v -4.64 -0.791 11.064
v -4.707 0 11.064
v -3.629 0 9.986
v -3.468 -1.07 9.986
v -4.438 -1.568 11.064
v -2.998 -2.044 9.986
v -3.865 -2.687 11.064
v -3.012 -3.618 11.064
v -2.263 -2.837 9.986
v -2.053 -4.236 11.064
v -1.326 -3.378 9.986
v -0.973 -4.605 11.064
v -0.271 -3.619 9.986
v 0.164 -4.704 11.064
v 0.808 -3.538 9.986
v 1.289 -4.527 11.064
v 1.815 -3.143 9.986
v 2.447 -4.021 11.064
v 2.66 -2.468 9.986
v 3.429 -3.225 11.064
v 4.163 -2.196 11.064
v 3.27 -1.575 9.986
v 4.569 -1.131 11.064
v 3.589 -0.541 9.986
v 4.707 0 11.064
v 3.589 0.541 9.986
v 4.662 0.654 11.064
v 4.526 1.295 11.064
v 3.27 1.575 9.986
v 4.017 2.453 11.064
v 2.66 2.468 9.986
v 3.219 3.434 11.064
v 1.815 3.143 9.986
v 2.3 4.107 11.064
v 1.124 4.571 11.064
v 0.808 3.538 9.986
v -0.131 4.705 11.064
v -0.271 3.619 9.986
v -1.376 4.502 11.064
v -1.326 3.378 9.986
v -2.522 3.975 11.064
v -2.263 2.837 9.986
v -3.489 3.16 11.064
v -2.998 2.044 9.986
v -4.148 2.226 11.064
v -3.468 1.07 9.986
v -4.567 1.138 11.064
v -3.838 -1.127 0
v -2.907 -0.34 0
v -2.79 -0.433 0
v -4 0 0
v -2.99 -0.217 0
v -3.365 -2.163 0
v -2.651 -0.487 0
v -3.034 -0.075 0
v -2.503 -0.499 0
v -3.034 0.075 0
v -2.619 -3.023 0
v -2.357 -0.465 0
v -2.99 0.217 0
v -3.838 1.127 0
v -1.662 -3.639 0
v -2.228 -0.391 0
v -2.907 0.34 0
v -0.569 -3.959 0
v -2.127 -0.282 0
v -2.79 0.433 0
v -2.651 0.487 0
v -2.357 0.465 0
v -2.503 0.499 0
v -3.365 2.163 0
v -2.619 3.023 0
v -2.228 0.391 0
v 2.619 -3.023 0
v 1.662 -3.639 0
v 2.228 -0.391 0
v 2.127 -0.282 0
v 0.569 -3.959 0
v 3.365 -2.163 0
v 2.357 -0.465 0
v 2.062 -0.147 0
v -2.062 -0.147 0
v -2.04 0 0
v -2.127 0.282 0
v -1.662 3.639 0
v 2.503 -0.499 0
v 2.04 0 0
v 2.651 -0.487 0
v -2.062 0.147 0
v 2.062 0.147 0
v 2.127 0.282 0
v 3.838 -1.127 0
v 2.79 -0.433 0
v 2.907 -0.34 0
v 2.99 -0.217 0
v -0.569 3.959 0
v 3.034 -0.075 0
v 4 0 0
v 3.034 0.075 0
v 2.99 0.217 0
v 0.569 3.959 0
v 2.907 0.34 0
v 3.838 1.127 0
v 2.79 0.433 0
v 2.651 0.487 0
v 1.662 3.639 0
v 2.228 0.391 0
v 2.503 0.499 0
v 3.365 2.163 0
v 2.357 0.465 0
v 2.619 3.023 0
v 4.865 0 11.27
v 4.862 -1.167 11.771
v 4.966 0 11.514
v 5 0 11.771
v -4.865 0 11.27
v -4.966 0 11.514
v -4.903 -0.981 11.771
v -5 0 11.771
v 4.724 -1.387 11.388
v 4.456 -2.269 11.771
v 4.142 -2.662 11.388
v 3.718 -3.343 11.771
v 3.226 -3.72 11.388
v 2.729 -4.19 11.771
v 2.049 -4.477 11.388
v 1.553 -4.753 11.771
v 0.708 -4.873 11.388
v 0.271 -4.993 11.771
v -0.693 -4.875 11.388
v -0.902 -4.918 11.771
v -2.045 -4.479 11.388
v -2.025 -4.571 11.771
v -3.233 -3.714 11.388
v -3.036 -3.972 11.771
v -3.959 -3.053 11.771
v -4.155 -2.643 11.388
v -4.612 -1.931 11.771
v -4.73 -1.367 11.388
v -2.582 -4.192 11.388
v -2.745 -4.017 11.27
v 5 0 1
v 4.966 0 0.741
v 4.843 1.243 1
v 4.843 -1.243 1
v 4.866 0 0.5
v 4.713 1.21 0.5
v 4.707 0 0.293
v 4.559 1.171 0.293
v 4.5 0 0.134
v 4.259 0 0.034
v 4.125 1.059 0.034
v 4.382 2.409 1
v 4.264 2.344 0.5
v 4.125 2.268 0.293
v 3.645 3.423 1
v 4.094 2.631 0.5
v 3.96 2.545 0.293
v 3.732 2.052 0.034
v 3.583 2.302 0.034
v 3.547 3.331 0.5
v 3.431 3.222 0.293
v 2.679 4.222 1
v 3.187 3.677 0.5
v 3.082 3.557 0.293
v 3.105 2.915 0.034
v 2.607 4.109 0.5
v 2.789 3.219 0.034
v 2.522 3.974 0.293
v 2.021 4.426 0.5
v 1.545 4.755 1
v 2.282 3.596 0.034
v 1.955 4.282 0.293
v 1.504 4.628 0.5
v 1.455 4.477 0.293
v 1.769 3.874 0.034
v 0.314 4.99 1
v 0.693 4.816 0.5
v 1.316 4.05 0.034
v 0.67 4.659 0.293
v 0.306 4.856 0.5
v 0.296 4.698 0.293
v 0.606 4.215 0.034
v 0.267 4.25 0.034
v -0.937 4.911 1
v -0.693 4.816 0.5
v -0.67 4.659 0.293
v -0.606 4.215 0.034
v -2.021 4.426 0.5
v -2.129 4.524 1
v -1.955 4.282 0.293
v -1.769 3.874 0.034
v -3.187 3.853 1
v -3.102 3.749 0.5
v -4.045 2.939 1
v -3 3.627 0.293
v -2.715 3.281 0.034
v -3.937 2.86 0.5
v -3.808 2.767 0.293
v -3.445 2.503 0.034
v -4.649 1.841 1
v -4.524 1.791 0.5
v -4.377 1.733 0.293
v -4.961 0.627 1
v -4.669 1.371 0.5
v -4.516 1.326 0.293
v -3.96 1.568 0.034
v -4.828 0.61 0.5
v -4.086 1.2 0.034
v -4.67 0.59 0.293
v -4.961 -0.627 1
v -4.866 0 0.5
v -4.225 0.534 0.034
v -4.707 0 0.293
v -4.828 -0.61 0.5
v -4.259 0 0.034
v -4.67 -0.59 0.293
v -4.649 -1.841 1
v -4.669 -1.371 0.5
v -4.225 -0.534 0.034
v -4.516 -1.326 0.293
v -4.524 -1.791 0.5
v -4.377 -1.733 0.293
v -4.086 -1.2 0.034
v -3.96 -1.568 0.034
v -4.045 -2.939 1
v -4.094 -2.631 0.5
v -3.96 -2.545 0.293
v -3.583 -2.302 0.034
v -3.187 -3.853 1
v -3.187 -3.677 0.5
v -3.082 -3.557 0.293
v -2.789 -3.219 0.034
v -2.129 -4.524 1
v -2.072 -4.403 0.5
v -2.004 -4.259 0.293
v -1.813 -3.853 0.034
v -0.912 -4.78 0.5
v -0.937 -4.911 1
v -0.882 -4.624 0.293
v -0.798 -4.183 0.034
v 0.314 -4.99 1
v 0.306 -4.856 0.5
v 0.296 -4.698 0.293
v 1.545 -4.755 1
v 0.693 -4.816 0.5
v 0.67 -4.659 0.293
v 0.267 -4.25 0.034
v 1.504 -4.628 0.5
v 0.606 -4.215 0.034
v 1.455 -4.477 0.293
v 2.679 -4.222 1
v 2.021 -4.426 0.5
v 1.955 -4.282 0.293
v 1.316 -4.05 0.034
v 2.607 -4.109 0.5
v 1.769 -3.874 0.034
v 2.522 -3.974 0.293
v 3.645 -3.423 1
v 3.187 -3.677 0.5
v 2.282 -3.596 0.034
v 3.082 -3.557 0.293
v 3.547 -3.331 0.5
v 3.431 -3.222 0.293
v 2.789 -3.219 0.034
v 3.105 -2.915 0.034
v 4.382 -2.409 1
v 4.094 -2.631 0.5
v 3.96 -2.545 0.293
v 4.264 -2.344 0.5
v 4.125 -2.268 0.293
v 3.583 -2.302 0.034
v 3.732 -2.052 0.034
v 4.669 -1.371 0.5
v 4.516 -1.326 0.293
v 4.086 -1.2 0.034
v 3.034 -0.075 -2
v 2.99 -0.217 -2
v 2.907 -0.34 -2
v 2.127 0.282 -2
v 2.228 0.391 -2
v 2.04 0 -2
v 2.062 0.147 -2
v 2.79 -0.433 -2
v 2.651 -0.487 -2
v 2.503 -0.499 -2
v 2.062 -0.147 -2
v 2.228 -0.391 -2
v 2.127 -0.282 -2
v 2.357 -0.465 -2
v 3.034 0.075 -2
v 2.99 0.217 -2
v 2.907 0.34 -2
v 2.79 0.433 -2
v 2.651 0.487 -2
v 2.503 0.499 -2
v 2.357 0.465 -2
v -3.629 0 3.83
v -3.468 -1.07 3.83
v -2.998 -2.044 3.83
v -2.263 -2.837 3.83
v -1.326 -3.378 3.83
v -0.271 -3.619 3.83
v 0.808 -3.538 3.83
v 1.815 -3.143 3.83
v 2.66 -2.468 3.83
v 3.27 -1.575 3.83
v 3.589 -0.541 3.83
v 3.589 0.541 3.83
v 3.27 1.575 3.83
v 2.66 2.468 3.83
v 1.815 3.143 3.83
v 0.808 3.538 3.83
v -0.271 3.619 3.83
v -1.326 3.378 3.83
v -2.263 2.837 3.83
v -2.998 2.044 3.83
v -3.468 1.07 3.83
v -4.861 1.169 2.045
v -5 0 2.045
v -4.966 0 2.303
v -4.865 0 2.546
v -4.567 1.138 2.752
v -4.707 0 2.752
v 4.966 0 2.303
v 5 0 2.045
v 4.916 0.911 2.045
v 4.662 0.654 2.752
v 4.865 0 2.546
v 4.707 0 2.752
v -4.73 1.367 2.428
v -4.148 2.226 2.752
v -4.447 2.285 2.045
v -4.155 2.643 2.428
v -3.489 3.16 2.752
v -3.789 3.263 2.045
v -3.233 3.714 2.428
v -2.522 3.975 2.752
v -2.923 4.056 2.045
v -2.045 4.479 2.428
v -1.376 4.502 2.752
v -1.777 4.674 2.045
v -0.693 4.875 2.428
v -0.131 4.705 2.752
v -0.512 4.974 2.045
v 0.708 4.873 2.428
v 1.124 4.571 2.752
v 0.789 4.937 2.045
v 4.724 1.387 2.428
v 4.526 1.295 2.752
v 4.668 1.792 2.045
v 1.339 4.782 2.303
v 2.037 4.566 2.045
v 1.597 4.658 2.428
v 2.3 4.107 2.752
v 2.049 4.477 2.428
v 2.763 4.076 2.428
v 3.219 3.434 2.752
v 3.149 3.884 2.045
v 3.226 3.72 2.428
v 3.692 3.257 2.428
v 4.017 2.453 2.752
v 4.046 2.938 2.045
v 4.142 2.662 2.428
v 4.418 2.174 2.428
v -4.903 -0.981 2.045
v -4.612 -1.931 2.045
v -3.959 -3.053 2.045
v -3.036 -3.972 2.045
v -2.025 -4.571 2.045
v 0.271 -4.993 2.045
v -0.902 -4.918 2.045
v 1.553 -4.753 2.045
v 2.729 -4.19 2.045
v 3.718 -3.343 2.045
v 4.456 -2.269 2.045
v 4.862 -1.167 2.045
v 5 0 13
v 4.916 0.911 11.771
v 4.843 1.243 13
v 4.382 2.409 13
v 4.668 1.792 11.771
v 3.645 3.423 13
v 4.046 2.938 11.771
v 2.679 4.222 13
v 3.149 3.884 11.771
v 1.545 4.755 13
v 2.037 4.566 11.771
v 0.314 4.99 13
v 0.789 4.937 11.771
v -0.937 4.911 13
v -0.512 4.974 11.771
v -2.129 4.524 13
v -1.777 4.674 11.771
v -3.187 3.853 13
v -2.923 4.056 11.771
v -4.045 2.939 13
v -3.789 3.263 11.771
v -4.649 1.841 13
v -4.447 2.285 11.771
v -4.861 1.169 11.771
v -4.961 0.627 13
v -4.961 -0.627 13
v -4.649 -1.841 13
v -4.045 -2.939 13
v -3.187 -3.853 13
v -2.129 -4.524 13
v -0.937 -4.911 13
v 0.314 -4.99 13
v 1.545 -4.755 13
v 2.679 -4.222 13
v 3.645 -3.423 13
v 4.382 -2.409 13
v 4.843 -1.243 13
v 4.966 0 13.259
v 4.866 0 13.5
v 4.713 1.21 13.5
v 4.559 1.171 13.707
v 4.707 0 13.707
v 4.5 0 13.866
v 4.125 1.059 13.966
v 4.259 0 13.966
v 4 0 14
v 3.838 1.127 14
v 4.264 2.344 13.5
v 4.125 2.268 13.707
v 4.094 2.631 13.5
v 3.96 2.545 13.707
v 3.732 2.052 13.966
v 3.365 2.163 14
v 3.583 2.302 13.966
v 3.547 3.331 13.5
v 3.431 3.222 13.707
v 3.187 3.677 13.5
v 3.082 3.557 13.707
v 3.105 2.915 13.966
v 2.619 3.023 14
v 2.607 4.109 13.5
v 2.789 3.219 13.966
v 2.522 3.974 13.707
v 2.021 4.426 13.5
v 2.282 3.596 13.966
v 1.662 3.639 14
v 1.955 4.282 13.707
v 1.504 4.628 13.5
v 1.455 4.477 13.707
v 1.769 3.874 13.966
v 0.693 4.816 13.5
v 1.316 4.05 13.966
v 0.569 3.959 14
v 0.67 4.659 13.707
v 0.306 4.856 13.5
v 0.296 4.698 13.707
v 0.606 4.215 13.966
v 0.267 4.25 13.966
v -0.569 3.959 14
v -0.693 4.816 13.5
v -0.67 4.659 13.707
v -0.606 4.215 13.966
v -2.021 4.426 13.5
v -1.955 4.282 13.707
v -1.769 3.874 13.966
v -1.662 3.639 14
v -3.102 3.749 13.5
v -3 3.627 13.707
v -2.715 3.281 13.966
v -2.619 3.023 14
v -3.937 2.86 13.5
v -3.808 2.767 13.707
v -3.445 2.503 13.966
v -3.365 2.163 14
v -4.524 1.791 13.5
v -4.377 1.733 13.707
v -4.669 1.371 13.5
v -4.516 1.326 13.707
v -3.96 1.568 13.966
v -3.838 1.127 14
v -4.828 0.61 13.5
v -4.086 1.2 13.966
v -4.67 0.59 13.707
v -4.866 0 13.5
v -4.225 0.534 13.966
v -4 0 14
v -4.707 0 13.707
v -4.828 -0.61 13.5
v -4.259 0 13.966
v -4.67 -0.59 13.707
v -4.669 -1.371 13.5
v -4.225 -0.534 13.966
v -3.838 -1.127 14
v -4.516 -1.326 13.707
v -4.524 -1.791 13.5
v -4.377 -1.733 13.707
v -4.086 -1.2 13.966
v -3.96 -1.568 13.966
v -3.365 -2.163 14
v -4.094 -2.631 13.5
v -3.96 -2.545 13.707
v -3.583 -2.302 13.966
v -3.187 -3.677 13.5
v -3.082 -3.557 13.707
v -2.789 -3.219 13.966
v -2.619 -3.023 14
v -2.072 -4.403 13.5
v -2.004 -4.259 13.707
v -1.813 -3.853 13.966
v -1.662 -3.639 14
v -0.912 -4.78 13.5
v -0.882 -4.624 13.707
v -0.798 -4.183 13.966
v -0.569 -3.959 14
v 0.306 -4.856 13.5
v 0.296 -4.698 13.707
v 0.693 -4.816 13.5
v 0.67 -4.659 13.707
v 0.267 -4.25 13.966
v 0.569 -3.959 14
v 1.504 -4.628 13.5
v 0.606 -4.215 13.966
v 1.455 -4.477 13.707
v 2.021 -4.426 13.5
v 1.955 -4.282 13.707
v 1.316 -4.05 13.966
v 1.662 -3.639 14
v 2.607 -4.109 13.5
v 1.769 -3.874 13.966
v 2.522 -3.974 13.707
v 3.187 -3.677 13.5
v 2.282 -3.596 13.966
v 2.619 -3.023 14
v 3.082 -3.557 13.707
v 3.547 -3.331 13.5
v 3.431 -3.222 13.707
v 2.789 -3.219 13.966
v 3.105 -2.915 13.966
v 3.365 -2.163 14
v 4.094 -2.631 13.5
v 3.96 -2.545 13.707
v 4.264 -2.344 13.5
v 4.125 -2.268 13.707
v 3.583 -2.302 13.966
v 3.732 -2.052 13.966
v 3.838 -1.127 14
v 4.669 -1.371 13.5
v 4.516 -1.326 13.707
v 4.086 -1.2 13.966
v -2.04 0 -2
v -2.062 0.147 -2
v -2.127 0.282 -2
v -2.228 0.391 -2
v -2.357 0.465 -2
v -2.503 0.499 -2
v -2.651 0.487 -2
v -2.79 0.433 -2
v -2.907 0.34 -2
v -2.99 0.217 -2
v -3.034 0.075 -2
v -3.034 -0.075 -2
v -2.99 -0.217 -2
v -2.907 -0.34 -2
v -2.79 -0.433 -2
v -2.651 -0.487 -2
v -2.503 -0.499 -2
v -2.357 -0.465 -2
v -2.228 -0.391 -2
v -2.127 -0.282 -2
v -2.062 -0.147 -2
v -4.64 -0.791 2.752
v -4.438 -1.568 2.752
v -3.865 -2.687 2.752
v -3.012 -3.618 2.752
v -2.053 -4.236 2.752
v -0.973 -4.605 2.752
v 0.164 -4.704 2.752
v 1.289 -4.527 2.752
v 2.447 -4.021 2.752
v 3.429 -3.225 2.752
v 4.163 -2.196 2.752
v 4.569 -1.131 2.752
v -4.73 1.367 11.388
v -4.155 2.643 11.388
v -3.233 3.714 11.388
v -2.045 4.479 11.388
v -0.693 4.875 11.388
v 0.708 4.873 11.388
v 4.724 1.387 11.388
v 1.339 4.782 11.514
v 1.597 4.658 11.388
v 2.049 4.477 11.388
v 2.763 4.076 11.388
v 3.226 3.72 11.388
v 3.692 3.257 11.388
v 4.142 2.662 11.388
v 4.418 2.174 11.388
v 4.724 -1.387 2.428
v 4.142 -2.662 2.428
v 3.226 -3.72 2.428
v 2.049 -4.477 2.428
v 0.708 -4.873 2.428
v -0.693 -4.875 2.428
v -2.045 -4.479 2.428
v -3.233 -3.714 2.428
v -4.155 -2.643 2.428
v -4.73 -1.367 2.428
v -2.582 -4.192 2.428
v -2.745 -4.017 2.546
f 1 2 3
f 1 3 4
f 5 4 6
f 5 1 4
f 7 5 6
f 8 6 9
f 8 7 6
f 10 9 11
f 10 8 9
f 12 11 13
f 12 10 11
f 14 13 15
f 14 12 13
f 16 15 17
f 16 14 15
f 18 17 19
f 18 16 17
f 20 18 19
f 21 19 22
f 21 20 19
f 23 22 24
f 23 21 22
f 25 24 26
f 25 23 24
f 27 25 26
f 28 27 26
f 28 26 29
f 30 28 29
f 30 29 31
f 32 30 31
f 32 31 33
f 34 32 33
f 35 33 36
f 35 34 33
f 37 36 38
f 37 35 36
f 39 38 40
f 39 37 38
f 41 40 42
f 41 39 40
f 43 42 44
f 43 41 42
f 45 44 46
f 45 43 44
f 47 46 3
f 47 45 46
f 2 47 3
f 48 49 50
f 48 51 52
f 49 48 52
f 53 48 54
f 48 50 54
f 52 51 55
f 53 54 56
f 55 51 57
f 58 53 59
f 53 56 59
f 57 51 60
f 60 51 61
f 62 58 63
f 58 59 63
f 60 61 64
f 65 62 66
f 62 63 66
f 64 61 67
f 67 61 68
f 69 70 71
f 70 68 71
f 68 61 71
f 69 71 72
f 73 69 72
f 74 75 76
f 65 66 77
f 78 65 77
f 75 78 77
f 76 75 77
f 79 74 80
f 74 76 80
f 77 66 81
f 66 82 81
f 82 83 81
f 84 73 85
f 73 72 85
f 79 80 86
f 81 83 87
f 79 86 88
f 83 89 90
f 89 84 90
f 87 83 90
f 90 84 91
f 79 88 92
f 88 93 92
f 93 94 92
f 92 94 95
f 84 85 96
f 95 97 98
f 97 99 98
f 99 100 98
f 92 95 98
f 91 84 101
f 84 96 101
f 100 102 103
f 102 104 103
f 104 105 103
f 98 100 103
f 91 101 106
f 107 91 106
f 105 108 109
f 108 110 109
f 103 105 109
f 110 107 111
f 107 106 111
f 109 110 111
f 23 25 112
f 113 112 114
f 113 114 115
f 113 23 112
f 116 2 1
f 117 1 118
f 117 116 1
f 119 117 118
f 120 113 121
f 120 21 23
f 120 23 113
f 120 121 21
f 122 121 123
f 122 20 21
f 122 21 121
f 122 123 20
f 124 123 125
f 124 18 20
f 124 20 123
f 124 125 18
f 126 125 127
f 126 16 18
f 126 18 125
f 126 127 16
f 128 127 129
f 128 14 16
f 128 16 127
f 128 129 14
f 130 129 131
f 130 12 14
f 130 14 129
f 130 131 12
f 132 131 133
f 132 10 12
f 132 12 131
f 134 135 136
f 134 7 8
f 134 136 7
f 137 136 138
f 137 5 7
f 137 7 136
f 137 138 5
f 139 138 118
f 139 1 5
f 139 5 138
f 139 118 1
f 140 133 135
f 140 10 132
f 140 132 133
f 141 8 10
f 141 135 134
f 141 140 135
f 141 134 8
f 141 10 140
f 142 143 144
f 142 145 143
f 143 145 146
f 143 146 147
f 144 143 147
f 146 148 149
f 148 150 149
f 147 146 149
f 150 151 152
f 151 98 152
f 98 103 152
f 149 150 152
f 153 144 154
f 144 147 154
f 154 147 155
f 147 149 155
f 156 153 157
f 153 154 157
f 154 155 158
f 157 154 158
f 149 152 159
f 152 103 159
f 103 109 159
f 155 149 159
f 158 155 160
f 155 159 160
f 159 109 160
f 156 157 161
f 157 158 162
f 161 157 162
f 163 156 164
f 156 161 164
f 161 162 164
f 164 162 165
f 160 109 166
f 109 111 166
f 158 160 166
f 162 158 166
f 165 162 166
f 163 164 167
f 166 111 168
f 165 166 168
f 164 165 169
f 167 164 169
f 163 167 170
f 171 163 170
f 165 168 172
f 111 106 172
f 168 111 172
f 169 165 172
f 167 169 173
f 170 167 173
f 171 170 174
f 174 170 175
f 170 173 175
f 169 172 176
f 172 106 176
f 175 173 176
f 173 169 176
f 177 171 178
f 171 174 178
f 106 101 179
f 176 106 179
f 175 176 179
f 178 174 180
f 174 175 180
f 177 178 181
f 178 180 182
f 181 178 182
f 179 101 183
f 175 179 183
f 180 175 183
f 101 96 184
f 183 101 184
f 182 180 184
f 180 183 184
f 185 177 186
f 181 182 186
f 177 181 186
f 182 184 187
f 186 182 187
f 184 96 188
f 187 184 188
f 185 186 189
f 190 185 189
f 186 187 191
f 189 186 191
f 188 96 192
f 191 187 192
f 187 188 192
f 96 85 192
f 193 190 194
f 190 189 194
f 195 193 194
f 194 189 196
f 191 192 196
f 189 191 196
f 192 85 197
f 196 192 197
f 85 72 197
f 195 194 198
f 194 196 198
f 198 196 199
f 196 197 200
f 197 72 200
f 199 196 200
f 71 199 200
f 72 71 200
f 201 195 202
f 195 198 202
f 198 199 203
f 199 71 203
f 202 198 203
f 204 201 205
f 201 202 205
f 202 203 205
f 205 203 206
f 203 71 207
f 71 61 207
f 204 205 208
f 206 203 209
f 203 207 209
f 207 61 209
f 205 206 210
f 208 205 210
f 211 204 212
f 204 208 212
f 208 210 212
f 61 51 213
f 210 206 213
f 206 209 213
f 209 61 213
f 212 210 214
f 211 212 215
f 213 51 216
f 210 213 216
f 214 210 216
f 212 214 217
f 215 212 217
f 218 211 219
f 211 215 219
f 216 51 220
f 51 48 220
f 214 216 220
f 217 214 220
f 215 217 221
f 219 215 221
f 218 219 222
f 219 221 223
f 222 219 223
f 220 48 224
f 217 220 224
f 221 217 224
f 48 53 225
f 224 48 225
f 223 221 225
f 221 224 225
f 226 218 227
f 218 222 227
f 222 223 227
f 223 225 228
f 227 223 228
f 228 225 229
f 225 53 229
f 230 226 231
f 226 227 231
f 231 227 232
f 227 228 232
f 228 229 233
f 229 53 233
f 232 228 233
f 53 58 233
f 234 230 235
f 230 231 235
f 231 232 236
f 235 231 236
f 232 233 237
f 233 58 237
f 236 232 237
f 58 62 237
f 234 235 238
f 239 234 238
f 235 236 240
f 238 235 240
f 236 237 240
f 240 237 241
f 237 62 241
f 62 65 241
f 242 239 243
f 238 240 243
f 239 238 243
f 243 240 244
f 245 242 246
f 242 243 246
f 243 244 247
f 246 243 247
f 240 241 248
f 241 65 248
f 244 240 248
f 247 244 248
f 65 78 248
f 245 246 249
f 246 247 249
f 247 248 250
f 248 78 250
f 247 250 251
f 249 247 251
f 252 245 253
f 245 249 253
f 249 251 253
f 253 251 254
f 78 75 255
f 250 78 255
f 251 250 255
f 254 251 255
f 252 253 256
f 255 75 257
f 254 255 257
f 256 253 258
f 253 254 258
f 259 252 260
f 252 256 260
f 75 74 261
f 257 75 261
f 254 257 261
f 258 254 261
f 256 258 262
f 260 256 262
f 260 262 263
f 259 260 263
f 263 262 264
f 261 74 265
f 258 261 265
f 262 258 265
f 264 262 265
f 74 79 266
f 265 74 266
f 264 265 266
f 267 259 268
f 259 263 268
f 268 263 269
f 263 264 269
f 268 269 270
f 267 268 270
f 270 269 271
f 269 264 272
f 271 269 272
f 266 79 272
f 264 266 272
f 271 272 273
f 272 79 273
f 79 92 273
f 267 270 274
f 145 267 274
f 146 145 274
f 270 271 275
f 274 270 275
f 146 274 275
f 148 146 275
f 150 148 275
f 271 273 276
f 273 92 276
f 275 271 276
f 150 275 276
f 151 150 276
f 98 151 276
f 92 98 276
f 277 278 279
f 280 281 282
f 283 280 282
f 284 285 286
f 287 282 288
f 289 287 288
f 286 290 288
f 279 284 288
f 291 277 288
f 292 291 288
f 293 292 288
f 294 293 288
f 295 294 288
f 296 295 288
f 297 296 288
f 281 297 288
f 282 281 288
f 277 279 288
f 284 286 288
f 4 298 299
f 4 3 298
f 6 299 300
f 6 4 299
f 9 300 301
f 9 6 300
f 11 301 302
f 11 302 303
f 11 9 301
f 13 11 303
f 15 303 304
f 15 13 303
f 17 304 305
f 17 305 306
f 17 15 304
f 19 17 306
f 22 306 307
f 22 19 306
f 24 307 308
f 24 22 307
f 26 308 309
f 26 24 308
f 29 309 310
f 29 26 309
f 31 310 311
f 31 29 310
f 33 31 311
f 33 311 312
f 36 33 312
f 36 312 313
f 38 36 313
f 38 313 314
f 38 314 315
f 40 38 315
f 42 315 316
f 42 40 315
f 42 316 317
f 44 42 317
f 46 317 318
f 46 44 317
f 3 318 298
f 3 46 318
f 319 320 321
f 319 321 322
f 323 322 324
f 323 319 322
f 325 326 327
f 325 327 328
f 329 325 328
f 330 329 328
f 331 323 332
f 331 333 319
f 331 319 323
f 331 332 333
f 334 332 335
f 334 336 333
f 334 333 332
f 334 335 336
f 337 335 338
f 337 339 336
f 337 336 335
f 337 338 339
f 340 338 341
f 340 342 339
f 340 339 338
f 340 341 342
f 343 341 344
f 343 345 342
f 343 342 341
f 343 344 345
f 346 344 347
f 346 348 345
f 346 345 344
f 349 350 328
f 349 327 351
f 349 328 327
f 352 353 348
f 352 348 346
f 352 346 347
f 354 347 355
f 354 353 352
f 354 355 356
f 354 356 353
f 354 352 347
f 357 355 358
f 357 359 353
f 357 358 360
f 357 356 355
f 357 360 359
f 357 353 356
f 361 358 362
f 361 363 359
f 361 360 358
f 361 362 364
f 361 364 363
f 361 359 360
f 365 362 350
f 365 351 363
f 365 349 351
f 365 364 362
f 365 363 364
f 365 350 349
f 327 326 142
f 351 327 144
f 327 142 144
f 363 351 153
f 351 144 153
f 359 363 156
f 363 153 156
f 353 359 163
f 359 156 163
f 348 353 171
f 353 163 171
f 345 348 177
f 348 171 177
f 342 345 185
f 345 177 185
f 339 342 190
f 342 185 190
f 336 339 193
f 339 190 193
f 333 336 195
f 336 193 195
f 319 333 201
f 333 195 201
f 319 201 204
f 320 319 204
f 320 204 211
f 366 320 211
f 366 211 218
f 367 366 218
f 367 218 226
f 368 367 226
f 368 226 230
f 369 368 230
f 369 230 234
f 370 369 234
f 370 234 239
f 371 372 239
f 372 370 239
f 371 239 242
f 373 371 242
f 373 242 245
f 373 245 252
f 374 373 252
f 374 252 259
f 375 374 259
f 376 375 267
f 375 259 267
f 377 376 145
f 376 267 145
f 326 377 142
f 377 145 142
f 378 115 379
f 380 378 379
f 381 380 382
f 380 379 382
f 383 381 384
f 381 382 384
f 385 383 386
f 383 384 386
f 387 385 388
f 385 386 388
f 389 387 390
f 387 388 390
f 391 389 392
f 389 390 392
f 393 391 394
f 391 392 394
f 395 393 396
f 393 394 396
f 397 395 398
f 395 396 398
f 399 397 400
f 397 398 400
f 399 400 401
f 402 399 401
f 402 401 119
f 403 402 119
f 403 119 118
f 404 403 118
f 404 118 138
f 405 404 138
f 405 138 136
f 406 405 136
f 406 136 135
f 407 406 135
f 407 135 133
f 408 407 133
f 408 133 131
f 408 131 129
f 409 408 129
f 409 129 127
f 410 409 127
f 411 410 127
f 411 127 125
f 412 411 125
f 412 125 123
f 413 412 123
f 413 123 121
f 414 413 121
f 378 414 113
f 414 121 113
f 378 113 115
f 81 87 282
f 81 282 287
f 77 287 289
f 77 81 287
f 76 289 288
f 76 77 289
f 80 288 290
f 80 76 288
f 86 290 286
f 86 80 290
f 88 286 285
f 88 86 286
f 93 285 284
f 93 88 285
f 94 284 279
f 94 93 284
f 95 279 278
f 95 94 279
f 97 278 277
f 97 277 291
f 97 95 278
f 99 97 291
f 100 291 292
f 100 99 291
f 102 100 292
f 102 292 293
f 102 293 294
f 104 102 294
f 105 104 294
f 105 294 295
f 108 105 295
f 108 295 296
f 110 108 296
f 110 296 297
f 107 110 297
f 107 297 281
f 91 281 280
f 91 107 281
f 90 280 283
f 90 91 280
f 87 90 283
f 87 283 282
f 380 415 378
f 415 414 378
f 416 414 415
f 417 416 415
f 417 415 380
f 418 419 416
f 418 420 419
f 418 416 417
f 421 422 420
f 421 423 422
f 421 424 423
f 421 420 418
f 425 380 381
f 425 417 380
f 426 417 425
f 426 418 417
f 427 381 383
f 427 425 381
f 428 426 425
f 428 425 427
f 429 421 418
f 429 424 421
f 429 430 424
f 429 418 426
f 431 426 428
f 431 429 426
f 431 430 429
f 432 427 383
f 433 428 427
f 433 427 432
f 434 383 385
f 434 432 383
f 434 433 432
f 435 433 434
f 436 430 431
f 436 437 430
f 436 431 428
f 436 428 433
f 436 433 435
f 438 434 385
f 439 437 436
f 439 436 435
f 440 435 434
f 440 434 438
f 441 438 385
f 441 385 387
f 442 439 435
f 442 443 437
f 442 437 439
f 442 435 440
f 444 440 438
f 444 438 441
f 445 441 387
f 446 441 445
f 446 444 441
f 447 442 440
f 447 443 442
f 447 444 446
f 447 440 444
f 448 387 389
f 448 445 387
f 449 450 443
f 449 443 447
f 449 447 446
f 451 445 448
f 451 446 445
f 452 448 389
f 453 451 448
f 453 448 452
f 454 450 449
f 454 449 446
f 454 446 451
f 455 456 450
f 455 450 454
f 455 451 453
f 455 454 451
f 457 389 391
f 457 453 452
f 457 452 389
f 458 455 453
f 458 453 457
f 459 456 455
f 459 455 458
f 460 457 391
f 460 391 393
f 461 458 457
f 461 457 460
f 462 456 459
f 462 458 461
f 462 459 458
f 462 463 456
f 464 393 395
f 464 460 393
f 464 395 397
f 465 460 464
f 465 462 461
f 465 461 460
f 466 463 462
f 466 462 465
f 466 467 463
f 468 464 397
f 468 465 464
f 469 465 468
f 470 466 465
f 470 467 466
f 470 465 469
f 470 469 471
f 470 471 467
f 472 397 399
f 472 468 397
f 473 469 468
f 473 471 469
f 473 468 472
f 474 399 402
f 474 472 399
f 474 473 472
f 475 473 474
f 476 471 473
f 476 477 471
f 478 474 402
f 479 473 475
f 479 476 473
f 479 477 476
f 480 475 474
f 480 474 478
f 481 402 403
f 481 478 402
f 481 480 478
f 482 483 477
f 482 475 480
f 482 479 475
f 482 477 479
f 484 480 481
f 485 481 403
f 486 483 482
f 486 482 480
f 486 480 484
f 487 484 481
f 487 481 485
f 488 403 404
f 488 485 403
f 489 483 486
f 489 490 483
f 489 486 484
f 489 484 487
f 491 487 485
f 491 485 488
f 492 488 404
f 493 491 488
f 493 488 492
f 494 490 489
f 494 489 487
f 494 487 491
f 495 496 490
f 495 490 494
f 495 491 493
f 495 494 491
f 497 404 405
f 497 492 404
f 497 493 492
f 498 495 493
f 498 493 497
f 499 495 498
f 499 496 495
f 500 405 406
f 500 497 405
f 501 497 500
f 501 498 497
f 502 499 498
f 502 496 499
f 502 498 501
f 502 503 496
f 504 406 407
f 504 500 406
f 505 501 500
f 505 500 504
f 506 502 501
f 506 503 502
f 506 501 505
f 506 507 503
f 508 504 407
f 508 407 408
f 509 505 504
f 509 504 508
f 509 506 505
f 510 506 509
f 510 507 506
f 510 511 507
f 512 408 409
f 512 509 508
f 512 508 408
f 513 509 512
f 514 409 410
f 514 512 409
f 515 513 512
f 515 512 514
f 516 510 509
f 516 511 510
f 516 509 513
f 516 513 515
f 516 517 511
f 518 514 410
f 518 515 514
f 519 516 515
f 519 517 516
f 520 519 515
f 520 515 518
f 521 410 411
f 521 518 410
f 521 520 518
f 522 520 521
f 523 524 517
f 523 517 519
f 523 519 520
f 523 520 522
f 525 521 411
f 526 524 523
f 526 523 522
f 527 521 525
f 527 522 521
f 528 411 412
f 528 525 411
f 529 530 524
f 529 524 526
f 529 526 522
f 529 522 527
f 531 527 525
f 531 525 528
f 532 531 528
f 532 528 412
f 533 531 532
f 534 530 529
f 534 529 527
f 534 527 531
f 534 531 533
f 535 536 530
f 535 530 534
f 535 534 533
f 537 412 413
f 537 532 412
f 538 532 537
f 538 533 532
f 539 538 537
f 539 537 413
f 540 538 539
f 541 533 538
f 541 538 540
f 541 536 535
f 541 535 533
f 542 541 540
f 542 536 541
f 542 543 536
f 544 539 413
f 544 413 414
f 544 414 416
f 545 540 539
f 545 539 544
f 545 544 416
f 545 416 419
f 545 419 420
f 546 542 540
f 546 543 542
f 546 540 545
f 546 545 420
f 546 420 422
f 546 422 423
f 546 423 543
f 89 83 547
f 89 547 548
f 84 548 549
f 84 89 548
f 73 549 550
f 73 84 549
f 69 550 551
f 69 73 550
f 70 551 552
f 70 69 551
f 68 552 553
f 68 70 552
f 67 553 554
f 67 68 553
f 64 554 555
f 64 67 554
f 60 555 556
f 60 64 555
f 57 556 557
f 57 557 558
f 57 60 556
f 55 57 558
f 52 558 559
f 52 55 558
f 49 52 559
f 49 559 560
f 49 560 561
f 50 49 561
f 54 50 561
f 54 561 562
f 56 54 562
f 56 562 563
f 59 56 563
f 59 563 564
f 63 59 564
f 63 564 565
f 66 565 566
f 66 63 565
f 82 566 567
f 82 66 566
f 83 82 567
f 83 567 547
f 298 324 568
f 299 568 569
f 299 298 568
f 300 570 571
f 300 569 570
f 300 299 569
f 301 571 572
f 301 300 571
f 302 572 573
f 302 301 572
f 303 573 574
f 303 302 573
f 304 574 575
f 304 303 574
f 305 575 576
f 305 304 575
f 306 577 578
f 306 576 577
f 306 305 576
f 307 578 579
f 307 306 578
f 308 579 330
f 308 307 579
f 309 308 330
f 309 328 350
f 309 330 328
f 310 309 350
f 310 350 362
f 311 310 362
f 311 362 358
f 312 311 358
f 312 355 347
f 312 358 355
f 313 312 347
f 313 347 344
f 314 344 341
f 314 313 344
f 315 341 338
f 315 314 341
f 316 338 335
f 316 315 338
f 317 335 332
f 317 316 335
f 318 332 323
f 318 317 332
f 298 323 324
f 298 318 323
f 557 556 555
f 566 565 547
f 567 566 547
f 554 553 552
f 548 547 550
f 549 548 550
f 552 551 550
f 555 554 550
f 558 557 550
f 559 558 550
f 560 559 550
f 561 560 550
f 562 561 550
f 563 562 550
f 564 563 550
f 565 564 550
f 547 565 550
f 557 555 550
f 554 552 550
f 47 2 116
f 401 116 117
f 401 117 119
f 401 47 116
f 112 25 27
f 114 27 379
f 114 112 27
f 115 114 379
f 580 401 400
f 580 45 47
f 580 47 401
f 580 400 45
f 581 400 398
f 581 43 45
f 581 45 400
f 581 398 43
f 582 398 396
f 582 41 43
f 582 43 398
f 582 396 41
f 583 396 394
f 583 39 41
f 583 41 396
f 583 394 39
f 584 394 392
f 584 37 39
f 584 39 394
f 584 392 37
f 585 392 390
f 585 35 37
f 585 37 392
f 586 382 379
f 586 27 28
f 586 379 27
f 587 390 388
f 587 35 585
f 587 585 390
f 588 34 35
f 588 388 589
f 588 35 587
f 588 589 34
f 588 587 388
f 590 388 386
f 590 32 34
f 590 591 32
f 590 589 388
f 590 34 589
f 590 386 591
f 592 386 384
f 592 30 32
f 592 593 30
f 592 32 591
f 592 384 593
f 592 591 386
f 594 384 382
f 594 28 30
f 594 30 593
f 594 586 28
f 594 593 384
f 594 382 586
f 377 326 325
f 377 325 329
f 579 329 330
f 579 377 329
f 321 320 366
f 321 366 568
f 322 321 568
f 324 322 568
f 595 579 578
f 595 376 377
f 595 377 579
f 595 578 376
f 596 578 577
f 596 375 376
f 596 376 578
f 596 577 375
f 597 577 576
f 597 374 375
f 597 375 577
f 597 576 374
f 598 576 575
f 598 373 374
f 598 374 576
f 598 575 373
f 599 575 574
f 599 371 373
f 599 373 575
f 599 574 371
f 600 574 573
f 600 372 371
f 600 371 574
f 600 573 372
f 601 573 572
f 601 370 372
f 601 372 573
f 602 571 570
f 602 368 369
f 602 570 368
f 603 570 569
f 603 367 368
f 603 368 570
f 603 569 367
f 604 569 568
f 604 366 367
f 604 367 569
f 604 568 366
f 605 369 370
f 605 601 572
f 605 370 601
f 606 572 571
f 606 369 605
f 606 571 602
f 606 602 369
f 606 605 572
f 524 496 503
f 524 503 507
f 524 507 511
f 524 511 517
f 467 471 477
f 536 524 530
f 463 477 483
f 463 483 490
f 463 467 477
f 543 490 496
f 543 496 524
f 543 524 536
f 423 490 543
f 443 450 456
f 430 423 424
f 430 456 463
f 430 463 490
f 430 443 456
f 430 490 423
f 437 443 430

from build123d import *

# Parameters (mm, degrees)
SKETCH_1_R      = 5
EXTRUDE_1_DEPTH = 14
SKETCH_4_R      = 0.5
EXTRUDE_2_DEPTH = 2
FILLET_2_R      = 1


with BuildPart() as part:
    # 草图1 → 凸台-拉伸1 (new body)
    with BuildSketch(Plane.XY):
        Circle(SKETCH_1_R)
    extrude(amount=EXTRUDE_1_DEPTH)

    # 草图3 → 切除-旋转1 (revolve, cut)
    with BuildSketch(Plane(origin=(0, 0, 0), x_dir=(1, 0, 0), z_dir=(0, 1, 0))):
        Polygon((-5.273110547, -2.186263047), (-3.629051397, -3.830322197), (-3.629051397, -9.985928365), (-5.273110547, -11.629987515), align=None)
    revolve(axis=Axis((0, 0, -0.7), (0, 0, 1)), mode=Mode.SUBTRACT)

    # 草图4 → 凸台-拉伸2 (add)
    with BuildSketch(Plane.XY):
        with Locations((-2.54, 0)):
            Circle(SKETCH_4_R)
        with Locations(Location((2.54, 0, 0), (0, 0, 180))):
            Circle(SKETCH_4_R)
    extrude(amount=-EXTRUDE_2_DEPTH)

    # 圆角2
    fillet_2_edges = [part.edges().sort_by_distance(p)[0] for p in [
        (-5, 0, 0),
        (-5, 0, 14),
        (0, -5, 2.459373595),
        (0, -5, 11.356876968),
    ]]
    fillet(fillet_2_edges, radius=FILLET_2_R)


solid = part.part
